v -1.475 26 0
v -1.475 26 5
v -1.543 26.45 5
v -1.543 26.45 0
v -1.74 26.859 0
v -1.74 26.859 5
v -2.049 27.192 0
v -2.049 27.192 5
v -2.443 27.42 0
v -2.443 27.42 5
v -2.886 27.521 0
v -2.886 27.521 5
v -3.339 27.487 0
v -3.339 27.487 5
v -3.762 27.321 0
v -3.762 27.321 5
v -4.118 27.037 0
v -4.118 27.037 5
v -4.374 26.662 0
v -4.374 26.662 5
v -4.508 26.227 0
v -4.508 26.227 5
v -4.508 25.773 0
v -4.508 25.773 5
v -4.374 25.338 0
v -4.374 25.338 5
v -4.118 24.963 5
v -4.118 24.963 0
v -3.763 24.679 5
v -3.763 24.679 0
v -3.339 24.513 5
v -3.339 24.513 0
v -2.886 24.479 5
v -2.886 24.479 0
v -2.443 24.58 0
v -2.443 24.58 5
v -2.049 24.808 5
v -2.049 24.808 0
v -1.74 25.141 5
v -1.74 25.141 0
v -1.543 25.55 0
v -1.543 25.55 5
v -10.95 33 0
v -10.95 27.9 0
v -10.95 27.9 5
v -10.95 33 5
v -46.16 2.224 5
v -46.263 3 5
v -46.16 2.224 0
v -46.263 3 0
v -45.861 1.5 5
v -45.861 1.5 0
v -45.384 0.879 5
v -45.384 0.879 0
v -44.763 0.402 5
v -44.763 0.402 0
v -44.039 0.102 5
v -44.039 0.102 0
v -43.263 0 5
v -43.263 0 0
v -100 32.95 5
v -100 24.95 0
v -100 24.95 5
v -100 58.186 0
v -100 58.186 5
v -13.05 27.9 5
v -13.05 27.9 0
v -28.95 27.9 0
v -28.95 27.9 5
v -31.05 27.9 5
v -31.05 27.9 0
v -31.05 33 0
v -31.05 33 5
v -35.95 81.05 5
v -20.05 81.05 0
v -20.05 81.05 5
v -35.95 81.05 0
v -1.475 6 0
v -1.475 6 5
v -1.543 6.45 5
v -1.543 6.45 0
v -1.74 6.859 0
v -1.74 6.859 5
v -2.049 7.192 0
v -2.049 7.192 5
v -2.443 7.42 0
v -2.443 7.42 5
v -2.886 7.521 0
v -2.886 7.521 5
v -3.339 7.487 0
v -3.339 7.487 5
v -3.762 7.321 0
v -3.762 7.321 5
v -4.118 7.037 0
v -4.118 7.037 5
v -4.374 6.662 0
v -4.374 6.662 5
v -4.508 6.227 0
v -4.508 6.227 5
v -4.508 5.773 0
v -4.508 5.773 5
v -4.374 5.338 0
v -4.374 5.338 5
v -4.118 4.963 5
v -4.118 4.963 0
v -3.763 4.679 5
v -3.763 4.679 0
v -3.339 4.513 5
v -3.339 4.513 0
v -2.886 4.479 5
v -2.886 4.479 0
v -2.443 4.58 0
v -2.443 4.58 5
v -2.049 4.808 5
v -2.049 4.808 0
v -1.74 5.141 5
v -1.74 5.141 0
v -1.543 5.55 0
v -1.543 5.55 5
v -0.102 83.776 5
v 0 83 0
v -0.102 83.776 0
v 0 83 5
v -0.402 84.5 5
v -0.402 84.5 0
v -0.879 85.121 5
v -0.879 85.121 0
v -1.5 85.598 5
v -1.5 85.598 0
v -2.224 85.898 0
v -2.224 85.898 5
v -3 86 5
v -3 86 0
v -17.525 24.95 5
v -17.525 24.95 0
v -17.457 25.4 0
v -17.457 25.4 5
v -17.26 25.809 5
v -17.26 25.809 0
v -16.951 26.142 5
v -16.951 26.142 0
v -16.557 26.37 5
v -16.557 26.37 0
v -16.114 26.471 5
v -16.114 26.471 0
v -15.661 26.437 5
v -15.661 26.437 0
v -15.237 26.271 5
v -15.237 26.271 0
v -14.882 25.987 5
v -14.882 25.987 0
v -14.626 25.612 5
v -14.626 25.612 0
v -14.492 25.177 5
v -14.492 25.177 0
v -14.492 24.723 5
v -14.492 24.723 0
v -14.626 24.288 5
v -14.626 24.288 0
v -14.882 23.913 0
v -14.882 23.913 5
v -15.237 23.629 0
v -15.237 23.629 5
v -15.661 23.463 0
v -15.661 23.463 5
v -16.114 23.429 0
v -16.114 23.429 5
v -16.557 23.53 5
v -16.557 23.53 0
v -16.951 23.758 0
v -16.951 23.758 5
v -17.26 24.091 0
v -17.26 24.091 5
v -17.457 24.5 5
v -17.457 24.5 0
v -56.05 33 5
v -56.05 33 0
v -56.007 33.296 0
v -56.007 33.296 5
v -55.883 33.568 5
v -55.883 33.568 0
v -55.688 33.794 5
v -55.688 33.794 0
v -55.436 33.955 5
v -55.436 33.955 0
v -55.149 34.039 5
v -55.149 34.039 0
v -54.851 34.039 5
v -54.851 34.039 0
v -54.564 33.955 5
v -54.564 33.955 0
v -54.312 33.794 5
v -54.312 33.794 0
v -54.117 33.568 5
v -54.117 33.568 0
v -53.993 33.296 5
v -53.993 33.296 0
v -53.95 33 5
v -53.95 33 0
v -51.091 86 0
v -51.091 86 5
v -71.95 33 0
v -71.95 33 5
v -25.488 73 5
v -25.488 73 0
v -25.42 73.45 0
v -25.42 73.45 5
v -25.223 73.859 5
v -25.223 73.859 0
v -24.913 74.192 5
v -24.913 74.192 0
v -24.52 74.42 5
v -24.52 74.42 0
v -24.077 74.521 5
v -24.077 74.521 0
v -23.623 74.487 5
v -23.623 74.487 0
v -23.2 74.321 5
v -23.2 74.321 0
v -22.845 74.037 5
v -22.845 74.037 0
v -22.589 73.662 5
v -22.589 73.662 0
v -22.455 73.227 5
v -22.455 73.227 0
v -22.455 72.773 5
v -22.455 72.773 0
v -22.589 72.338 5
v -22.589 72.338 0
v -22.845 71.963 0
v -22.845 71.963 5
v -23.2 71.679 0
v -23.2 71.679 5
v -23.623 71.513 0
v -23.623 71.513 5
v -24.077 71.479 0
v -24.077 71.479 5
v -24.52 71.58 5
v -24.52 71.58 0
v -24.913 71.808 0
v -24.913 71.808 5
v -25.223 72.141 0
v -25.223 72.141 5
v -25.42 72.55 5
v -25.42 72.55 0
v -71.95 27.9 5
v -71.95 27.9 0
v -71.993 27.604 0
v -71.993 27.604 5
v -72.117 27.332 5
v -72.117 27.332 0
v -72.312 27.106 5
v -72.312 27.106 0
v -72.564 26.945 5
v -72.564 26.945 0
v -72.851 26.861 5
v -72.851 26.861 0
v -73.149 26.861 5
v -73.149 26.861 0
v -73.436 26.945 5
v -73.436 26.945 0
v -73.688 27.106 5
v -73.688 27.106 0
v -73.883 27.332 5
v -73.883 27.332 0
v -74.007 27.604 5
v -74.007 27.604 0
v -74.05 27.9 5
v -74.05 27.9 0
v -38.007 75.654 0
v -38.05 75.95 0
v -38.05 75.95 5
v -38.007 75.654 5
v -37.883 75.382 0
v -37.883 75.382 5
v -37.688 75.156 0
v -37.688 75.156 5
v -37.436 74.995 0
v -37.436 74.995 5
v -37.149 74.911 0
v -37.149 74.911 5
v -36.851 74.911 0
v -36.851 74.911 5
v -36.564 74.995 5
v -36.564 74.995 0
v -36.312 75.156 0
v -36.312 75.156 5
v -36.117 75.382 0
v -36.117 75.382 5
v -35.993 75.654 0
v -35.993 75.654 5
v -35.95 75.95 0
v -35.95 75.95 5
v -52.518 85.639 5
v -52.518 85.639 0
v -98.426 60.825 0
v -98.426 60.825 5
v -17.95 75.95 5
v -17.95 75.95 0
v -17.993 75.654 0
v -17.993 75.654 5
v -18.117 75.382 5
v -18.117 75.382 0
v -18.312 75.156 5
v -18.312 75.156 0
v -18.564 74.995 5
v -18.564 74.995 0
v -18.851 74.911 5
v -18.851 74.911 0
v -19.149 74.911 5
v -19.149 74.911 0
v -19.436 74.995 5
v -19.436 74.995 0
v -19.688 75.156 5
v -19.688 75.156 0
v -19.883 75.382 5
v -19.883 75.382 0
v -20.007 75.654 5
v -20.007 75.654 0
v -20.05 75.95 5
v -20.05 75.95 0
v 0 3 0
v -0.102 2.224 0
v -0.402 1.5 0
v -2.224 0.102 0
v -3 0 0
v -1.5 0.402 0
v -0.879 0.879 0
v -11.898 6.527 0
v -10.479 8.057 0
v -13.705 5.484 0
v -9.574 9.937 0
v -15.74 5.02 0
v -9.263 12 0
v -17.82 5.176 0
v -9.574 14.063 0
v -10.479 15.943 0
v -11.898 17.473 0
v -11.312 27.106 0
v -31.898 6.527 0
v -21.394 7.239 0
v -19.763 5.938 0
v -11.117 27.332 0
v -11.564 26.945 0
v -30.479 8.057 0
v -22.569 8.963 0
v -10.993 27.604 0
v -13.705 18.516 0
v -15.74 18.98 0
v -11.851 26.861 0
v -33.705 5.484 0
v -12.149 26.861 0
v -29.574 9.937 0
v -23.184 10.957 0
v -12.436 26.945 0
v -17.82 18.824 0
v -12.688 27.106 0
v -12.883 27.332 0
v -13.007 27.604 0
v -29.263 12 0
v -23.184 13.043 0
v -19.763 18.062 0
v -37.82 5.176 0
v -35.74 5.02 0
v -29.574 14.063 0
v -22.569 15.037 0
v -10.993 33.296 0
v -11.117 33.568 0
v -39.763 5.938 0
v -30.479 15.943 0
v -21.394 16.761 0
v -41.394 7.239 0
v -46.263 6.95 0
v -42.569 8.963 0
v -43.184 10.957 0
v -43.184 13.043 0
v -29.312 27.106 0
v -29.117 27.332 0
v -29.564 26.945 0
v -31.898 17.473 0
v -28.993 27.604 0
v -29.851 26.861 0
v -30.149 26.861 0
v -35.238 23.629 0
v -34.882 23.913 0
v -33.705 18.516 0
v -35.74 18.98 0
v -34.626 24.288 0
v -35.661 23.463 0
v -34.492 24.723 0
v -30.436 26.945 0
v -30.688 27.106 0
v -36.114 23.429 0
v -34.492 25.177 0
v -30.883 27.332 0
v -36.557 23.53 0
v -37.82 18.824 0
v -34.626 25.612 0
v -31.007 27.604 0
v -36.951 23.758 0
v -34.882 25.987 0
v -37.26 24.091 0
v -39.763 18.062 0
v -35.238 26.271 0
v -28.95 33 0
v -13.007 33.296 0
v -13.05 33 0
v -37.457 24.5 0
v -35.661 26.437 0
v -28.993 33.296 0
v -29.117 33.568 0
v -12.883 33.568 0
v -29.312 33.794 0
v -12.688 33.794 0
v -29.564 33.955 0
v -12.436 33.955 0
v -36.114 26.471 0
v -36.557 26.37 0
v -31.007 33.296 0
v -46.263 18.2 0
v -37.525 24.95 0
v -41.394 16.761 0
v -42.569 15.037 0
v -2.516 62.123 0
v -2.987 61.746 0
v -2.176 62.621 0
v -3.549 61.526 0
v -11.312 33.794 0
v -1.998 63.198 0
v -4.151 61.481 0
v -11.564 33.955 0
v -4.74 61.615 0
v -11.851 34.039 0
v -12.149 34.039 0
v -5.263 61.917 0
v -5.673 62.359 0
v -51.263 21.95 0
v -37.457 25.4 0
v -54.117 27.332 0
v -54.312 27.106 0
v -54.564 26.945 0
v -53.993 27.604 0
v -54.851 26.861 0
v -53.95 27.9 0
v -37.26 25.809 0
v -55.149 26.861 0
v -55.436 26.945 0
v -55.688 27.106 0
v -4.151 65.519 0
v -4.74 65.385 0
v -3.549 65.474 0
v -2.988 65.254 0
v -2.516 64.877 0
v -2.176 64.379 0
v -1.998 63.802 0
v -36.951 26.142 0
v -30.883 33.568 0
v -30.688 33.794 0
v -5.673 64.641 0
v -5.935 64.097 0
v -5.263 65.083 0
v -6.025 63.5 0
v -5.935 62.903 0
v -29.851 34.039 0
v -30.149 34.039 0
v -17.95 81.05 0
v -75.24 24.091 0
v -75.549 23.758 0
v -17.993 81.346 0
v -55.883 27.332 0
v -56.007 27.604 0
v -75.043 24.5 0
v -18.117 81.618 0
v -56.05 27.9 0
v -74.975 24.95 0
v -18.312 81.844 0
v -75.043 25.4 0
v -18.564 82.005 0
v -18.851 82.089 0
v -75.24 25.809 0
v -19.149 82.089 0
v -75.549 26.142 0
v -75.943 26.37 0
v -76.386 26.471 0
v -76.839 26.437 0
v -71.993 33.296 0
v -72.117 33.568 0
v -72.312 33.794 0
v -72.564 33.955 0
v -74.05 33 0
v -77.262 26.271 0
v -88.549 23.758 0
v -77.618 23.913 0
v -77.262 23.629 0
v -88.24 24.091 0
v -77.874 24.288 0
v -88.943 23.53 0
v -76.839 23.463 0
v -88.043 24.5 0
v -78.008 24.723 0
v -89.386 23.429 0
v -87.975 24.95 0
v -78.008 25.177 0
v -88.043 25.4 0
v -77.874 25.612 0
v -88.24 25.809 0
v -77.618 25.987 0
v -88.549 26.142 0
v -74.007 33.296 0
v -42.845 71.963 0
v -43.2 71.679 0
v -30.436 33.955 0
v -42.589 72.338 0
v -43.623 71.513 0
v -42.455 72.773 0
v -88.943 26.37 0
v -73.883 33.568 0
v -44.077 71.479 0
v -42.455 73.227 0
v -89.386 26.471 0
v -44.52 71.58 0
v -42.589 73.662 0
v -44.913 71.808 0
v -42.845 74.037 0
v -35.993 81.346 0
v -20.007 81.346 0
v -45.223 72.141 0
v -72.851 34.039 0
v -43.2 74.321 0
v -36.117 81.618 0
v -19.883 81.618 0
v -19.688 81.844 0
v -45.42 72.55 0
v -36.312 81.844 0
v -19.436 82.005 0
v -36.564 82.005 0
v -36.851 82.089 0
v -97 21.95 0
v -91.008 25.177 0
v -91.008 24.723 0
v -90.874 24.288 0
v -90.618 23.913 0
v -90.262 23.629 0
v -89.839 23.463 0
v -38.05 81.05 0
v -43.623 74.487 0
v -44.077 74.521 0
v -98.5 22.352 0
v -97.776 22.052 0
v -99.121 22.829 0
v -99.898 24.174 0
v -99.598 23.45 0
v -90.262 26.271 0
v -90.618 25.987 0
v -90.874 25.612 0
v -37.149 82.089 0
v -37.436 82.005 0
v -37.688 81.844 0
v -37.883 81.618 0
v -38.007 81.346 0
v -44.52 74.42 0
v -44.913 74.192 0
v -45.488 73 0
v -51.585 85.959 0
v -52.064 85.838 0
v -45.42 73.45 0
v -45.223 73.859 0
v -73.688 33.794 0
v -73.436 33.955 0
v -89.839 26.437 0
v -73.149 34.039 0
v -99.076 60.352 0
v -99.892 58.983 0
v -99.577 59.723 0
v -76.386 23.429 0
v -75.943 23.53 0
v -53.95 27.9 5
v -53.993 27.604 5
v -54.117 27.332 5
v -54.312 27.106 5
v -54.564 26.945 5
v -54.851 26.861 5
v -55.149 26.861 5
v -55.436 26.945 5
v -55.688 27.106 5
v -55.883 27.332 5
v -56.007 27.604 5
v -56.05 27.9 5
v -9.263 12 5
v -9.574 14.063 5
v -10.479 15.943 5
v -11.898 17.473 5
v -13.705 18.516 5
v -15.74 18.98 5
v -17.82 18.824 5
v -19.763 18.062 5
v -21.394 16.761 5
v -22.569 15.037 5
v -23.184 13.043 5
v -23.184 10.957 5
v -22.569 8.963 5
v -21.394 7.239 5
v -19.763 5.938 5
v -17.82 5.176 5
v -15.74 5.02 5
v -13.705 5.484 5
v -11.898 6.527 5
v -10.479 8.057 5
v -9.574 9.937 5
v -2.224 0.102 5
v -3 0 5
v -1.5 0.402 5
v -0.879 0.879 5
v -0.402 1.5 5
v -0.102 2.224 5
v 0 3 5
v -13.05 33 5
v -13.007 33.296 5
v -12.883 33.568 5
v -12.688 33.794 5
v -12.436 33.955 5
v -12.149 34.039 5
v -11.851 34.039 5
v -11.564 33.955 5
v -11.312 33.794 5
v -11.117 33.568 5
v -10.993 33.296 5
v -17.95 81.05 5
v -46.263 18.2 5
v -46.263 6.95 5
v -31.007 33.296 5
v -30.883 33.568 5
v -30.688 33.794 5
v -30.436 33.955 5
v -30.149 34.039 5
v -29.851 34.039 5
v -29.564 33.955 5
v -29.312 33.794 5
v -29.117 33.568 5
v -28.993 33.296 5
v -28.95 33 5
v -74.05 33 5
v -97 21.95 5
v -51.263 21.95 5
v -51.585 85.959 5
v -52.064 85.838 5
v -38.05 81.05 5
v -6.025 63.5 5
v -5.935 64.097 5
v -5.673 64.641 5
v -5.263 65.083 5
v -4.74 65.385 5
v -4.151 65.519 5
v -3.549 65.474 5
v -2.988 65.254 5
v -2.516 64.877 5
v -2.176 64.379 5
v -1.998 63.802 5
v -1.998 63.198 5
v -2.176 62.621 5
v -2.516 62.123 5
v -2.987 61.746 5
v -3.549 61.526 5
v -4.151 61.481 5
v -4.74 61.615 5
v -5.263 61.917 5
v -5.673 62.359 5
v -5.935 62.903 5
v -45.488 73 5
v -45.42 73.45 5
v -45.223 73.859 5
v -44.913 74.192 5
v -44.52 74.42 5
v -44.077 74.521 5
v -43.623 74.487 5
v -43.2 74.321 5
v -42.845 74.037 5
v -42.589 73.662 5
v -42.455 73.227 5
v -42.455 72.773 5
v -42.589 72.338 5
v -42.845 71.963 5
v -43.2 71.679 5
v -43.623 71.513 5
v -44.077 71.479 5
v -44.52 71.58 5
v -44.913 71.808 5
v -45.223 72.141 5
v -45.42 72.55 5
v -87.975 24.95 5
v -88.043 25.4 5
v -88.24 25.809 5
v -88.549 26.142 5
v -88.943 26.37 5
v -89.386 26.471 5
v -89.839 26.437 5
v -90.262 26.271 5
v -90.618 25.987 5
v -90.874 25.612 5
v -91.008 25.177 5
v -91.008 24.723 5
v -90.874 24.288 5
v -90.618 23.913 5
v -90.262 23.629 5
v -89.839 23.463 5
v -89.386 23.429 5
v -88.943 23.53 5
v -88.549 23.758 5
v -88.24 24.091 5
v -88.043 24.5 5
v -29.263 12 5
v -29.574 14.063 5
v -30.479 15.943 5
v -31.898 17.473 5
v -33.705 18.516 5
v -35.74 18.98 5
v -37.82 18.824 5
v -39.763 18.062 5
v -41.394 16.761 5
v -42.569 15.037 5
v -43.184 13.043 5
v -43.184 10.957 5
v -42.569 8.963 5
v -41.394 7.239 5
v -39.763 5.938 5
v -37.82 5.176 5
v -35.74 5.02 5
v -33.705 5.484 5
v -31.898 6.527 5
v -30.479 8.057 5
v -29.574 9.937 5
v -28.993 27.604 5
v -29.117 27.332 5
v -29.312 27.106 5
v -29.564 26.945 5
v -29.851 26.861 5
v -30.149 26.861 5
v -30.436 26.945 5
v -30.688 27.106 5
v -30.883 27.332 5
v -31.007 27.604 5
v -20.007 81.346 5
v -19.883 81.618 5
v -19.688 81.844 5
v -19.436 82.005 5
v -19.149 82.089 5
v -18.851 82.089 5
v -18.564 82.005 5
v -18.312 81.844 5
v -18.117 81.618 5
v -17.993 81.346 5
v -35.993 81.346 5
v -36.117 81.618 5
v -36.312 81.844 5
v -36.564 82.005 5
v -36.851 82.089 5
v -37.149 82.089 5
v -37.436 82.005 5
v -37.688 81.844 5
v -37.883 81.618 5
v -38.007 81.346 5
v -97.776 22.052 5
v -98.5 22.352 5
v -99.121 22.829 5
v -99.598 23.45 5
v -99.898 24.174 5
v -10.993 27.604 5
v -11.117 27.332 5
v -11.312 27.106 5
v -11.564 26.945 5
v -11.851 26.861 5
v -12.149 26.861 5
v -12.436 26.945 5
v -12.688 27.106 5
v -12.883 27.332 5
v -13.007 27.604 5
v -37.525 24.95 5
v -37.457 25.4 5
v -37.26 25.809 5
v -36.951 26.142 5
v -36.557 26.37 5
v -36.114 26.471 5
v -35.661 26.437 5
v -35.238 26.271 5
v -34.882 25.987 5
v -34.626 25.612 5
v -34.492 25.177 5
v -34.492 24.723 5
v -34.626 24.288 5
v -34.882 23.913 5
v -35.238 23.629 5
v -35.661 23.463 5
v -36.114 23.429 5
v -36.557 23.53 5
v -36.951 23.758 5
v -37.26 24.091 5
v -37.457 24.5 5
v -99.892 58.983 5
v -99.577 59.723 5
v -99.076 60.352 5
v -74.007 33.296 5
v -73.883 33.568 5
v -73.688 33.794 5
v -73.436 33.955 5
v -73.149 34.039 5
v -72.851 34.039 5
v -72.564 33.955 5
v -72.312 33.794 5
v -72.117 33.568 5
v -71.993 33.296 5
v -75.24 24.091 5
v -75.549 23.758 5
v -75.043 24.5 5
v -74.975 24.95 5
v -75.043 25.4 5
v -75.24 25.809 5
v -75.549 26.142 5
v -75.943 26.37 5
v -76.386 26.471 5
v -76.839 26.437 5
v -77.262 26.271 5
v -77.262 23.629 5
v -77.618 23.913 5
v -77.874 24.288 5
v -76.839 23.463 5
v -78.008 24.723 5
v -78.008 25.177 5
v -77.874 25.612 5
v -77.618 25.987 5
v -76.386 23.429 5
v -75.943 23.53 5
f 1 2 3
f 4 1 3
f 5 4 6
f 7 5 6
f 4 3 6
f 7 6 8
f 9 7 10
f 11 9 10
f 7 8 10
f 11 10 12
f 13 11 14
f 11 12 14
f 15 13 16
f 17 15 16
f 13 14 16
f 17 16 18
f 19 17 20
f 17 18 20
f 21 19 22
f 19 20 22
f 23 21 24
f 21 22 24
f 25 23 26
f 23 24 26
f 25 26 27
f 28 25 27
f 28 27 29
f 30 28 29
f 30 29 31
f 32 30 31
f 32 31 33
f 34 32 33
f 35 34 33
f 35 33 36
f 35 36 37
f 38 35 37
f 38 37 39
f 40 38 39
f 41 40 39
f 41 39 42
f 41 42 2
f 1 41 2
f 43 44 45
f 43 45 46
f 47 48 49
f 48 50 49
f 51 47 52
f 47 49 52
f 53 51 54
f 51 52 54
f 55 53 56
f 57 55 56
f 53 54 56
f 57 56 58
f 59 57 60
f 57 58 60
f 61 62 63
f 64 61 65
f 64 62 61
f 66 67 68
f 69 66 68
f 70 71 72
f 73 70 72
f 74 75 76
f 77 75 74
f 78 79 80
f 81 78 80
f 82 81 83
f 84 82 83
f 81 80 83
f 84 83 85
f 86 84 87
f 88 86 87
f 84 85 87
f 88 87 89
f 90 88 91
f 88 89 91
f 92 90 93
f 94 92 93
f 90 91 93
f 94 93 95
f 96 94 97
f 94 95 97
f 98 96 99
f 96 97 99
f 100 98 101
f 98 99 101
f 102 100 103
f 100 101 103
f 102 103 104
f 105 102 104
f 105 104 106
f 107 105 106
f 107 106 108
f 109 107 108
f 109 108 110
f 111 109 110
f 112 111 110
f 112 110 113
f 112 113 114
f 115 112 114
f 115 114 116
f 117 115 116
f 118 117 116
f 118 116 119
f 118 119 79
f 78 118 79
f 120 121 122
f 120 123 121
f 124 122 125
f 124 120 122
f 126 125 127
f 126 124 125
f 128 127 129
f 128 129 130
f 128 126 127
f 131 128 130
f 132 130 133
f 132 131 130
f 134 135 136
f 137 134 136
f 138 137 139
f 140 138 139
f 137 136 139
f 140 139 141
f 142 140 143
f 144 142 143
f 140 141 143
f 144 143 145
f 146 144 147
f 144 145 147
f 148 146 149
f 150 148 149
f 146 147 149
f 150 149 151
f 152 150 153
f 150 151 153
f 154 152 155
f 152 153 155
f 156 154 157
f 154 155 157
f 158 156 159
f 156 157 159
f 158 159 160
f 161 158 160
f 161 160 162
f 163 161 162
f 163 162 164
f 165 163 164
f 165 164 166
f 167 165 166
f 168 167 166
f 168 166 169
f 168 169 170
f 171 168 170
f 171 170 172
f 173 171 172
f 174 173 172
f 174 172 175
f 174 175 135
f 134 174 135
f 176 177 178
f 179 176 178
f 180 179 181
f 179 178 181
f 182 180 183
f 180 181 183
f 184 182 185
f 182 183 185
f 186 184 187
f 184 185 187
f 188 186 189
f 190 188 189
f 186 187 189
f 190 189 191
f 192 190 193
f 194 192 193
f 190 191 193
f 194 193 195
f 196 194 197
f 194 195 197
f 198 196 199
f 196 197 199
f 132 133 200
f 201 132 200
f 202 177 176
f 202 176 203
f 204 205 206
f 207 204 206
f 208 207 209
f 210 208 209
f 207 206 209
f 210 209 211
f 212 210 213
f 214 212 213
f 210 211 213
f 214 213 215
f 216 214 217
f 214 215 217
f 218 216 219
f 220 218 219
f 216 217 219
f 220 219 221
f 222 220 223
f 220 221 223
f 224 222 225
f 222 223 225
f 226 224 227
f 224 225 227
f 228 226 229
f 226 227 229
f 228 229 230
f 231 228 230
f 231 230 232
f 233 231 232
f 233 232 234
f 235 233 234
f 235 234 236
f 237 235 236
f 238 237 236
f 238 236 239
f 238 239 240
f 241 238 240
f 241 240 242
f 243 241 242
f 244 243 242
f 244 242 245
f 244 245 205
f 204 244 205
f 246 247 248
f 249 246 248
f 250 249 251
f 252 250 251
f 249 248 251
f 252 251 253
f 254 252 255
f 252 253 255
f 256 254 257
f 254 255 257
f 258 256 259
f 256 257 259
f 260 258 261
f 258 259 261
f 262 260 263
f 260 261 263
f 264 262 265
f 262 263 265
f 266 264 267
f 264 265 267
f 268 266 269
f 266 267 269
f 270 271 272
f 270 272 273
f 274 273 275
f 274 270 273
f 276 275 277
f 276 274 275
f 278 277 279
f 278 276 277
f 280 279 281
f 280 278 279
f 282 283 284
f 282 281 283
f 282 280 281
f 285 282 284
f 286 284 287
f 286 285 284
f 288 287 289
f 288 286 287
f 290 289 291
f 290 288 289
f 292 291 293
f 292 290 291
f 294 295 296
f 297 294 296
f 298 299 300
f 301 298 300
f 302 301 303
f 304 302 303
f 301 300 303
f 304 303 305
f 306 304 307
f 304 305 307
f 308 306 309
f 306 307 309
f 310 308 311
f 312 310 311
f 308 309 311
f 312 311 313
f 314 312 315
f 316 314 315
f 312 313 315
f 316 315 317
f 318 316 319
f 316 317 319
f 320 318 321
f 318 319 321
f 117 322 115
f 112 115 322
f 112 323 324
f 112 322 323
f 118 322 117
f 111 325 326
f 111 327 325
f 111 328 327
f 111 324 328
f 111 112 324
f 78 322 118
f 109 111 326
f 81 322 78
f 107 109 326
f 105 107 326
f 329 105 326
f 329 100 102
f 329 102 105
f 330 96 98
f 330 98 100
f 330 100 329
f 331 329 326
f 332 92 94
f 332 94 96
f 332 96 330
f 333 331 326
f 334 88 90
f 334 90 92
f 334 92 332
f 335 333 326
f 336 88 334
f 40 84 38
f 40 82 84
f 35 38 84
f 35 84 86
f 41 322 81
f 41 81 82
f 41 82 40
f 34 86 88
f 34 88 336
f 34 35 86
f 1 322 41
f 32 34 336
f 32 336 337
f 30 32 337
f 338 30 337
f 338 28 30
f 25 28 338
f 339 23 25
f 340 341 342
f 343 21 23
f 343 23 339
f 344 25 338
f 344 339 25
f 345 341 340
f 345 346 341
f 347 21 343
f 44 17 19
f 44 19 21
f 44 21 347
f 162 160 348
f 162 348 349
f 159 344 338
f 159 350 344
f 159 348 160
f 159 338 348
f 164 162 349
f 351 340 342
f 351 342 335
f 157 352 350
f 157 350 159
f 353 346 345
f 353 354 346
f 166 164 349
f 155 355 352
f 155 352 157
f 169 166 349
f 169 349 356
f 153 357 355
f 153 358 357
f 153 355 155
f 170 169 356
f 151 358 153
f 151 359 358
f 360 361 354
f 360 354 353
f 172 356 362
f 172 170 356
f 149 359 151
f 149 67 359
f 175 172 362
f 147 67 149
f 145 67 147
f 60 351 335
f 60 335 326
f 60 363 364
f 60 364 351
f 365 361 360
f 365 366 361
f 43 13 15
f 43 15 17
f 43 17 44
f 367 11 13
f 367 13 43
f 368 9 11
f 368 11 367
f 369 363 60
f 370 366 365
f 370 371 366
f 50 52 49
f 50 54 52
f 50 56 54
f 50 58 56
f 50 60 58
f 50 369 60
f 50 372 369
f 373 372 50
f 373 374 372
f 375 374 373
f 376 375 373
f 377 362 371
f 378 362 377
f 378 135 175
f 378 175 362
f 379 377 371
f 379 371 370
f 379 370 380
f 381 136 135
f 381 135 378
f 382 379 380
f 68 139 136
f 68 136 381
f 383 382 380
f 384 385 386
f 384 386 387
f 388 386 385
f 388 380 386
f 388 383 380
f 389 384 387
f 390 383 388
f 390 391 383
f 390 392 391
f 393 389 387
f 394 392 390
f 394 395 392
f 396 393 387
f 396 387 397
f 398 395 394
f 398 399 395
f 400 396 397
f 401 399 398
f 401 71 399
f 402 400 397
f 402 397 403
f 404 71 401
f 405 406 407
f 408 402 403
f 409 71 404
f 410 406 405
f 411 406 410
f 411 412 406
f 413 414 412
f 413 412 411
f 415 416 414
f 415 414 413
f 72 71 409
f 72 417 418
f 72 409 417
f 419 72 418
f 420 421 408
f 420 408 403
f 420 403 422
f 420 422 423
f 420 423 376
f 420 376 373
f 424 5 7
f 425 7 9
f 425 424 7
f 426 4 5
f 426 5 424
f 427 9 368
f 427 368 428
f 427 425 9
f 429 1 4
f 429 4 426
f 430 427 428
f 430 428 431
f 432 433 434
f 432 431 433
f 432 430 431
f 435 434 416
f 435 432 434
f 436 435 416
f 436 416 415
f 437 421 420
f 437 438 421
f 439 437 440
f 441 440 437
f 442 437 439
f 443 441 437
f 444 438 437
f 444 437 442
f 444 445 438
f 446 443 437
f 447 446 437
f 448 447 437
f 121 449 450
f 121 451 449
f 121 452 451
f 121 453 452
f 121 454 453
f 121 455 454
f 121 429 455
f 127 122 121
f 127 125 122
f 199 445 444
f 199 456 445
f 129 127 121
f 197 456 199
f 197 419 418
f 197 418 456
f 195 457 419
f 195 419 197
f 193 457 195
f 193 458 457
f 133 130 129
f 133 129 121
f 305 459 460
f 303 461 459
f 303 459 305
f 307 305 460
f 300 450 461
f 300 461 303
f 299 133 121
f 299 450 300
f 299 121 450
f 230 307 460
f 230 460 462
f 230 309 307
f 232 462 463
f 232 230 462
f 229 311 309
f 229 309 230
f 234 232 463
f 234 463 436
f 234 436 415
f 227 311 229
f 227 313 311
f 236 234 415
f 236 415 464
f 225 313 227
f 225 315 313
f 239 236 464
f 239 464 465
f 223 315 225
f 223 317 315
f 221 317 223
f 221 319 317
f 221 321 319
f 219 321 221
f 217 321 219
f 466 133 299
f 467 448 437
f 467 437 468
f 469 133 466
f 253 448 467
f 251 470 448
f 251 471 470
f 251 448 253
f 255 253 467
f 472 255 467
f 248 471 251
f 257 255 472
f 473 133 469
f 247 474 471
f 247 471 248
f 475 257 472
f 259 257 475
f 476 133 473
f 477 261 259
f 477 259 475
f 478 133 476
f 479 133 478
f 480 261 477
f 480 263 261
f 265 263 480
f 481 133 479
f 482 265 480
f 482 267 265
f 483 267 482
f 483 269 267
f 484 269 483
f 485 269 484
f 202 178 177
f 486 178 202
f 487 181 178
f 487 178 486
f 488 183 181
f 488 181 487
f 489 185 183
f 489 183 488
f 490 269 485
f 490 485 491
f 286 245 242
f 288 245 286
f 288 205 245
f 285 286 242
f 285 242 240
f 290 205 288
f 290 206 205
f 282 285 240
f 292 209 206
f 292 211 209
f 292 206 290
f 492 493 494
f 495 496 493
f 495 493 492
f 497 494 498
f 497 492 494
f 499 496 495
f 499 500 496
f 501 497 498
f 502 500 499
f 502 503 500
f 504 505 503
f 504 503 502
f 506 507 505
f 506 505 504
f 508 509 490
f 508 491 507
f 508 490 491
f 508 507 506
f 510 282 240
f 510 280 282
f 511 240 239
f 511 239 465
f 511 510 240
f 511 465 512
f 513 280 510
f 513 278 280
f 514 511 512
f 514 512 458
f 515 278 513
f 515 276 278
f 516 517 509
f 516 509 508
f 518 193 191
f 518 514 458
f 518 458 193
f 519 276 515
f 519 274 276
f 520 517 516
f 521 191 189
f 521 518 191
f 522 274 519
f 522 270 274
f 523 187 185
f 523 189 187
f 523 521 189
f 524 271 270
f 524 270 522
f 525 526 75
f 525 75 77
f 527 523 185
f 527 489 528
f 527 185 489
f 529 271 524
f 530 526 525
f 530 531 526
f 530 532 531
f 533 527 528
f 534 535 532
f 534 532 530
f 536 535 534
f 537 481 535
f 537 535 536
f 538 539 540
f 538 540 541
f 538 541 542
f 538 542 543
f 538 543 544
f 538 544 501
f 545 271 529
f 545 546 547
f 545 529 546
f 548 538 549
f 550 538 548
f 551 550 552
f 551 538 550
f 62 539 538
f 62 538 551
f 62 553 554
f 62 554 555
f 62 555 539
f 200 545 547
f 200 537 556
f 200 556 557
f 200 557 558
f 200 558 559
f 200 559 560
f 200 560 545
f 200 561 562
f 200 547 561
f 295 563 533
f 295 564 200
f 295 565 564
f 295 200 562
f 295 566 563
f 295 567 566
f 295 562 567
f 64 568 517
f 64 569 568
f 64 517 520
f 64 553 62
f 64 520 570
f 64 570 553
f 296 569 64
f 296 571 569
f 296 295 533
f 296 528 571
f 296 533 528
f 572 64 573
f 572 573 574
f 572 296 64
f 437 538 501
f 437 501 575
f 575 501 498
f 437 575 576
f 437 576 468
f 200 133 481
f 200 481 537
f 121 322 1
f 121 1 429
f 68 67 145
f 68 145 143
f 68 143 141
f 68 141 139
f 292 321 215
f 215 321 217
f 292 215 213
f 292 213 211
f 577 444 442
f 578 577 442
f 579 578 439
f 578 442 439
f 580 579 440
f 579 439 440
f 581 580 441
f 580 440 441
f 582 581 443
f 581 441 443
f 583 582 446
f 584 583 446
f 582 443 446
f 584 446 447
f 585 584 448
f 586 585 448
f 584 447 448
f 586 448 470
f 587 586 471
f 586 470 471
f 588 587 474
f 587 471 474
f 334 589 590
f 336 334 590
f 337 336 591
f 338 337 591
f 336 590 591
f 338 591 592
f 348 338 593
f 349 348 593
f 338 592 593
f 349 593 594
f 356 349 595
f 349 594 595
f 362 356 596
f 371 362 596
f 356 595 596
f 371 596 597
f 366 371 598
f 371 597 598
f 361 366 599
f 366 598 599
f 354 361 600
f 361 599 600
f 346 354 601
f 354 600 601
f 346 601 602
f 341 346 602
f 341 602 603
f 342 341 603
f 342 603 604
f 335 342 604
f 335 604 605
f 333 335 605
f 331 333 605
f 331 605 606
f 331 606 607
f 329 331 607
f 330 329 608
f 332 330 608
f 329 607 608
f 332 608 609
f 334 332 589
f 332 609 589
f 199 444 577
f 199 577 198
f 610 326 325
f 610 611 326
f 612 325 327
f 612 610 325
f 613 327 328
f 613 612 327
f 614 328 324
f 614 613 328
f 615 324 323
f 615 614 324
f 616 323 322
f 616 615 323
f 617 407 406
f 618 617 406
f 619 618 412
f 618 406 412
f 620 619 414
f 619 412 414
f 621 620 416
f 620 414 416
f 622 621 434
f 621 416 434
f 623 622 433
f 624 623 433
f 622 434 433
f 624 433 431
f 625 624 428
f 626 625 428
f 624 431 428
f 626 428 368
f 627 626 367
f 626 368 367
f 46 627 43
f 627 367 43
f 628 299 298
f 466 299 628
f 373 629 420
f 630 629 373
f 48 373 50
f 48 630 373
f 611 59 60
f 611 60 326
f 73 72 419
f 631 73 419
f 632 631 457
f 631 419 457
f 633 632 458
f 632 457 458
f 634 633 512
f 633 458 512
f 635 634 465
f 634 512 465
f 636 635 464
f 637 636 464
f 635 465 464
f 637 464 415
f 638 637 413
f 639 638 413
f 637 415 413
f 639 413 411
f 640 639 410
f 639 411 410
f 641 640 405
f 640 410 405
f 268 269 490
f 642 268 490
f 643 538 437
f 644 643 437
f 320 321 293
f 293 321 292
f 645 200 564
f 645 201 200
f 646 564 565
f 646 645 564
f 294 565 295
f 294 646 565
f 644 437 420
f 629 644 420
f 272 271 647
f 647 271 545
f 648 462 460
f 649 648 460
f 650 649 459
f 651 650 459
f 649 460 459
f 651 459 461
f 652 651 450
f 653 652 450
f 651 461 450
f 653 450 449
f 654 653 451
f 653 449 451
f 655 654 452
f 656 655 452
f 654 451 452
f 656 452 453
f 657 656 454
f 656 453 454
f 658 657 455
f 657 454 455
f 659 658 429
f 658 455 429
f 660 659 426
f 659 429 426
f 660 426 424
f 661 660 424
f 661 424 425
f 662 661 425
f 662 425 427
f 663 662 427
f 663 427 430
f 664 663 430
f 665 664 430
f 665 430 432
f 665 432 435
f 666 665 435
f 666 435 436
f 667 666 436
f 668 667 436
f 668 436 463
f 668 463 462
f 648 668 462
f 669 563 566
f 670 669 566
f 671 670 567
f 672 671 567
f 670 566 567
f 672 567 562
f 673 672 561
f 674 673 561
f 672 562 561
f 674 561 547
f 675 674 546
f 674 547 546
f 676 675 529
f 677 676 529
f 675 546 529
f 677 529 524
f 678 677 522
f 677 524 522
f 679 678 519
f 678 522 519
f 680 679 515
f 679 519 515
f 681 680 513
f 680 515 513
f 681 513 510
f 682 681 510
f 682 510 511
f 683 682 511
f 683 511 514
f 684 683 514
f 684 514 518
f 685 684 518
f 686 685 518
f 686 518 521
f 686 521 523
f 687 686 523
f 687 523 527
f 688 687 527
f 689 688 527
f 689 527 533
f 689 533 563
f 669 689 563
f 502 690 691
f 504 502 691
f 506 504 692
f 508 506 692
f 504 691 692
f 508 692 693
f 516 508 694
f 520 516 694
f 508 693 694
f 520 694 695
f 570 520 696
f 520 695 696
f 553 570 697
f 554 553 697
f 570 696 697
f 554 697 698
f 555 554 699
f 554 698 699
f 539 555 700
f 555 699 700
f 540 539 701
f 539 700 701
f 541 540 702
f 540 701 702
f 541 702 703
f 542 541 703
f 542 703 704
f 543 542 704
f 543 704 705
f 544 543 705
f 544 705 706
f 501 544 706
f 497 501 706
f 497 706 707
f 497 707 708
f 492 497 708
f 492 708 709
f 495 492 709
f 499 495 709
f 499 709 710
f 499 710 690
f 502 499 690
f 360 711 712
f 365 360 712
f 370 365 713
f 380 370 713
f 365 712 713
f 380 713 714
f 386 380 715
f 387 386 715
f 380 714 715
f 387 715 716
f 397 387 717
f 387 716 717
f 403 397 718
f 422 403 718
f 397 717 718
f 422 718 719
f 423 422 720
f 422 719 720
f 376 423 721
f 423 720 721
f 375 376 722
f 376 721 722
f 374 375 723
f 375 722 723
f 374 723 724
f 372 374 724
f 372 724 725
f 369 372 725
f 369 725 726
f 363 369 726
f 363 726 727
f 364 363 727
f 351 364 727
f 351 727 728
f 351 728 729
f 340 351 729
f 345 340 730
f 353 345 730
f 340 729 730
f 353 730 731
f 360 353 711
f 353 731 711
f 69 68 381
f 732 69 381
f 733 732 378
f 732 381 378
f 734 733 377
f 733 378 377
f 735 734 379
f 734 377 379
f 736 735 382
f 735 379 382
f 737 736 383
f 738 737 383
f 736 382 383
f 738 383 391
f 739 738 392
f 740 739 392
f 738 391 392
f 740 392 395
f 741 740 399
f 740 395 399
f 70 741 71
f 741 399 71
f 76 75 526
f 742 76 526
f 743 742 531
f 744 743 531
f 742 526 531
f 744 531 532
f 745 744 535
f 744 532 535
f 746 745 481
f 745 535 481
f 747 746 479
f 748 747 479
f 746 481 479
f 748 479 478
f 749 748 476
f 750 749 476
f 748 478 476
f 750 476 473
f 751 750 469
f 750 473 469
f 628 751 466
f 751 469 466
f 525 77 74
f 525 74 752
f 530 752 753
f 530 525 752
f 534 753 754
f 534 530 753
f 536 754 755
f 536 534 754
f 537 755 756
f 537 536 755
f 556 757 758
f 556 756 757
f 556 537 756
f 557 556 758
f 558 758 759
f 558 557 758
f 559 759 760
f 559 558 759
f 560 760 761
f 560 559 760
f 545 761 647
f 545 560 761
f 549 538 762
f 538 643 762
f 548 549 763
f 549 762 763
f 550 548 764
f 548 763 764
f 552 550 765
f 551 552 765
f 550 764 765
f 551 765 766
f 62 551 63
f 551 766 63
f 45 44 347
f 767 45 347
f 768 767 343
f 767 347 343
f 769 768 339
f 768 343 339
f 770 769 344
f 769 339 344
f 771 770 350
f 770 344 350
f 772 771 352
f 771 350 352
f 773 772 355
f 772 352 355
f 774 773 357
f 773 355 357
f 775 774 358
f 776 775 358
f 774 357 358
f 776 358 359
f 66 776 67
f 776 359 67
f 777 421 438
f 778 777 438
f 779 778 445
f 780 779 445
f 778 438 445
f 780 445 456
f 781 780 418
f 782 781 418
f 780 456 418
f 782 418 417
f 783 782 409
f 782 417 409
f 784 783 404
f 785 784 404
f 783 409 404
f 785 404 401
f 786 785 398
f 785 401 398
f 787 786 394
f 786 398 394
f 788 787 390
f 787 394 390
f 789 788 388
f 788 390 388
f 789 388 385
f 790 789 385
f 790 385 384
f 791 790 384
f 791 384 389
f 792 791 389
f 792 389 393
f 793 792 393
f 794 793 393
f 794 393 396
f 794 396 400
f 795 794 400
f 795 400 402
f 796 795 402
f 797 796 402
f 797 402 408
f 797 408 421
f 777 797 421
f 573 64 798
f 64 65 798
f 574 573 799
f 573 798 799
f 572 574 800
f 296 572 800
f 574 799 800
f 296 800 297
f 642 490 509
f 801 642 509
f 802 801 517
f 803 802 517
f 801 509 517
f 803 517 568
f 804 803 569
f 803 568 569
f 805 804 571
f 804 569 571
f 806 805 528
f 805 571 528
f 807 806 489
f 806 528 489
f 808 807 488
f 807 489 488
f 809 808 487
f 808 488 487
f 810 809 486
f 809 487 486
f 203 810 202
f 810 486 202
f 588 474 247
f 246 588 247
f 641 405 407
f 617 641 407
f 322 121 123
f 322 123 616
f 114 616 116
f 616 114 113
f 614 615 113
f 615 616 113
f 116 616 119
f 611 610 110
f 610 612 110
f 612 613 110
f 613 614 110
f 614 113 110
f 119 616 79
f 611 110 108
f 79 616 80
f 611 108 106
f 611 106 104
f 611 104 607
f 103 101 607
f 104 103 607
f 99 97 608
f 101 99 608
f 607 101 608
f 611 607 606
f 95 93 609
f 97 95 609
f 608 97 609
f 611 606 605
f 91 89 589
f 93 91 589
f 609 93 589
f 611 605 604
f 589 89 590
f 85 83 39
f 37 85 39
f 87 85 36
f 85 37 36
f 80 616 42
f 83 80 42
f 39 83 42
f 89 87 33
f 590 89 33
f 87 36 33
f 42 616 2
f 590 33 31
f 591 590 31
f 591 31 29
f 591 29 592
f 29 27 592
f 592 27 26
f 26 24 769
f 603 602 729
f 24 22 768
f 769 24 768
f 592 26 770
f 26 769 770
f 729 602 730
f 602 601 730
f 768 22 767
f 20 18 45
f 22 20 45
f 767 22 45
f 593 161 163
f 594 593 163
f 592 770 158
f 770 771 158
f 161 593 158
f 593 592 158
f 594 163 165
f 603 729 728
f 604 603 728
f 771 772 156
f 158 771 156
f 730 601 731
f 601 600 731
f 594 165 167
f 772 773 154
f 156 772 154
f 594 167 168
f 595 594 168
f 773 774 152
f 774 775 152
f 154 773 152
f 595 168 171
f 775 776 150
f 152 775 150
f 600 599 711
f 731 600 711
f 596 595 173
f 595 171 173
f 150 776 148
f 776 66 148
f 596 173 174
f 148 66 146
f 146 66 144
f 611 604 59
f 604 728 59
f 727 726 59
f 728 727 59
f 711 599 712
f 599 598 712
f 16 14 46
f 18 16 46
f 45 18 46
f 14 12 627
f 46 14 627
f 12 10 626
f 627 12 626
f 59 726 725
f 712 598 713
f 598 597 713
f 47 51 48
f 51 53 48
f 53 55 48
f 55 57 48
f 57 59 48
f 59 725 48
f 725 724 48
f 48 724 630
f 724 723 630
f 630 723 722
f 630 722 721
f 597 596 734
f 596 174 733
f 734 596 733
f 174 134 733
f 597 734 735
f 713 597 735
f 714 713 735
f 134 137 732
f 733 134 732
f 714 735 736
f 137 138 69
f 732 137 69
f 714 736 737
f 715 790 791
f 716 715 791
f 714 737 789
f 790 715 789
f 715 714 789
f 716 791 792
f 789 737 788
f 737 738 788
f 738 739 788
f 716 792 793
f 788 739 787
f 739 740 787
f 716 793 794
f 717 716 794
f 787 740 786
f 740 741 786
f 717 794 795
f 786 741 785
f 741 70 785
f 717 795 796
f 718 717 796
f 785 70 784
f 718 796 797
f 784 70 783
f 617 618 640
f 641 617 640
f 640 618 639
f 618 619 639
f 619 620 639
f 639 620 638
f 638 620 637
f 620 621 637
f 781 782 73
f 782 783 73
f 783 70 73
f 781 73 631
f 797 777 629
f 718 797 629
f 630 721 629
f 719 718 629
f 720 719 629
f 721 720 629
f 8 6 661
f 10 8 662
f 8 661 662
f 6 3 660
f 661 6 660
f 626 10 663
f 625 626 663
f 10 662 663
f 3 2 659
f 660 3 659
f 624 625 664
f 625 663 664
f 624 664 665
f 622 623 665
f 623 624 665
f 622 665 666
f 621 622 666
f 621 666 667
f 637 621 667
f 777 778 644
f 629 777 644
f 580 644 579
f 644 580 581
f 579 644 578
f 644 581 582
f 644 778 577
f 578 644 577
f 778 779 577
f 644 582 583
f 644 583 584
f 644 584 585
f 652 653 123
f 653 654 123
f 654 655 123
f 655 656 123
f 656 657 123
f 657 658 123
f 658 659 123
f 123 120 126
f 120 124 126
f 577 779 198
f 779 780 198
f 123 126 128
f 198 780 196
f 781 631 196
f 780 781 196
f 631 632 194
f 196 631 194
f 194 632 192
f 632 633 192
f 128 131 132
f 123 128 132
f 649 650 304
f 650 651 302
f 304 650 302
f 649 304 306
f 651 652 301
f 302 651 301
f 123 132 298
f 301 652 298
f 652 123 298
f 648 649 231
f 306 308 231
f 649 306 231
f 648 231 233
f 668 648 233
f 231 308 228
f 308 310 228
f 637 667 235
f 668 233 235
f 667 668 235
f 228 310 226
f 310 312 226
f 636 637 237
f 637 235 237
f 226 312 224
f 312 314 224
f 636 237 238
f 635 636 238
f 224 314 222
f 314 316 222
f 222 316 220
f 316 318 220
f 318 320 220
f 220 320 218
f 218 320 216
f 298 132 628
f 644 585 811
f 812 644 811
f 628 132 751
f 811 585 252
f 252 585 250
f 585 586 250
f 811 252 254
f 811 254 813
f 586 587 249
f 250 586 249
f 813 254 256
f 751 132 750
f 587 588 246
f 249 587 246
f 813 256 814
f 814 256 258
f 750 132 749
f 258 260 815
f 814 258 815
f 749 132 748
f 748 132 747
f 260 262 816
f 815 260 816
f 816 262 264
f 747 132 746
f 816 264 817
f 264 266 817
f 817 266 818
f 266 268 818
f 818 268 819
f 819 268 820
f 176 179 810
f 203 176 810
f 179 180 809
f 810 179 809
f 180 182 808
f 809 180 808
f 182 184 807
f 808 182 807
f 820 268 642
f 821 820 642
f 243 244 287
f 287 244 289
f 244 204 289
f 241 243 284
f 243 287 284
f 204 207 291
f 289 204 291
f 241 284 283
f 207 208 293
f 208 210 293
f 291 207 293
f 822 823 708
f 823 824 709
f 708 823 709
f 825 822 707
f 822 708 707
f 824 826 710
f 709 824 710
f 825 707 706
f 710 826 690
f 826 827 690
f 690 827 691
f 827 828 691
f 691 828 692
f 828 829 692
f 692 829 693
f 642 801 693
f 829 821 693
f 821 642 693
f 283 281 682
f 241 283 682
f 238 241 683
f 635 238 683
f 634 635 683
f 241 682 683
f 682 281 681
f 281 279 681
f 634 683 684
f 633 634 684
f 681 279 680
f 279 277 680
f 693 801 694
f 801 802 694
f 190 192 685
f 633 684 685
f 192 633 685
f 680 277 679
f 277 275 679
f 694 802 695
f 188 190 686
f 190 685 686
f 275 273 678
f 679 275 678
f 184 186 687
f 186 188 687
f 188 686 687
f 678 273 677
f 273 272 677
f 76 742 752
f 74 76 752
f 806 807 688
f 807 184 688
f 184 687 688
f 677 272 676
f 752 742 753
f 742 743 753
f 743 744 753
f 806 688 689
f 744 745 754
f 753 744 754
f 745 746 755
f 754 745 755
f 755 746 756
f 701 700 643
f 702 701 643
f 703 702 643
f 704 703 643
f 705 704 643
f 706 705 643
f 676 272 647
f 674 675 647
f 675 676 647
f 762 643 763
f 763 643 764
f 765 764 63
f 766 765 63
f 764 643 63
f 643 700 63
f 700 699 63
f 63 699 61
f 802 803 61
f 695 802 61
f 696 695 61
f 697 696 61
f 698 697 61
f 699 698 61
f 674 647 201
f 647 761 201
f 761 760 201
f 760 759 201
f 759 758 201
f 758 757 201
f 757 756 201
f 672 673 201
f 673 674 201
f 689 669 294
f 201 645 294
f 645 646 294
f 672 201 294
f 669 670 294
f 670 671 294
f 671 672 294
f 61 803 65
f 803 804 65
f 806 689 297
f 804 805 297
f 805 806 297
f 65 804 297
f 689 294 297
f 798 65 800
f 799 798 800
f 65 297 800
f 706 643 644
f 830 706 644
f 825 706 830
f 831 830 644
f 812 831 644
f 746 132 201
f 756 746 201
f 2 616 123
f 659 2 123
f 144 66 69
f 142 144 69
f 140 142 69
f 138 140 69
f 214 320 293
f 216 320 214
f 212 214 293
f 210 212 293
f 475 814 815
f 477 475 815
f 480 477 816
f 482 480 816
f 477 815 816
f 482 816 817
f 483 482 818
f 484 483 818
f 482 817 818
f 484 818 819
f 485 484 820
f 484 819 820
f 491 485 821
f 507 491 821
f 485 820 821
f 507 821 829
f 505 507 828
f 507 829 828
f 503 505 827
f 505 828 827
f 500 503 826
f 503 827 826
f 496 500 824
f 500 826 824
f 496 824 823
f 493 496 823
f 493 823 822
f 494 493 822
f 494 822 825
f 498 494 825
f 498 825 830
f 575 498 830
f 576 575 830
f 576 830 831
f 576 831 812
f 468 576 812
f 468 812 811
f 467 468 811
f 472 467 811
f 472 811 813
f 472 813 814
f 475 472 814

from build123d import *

# Parameters (mm, degrees)
EXTRUDE_1_DEPTH           = 5
SKETCH_4_W                = 20.1
SKETCH_4_H                = 5.1
CUT_EXTRUDE_3_DEPTH       = 1
CUT_EXTRUDE_3_DEPTH_BACK  = 6
CUT_EXTRUDE_4_DEPTH       = 6
SKETCH_6_R                = 1.525
CUT_EXTRUDE_5_DEPTH       = 1
CUT_EXTRUDE_5_DEPTH_BACK  = 6
CUT_EXTRUDE_6_DEPTH       = 1
CUT_EXTRUDE_6_DEPTH_BACK  = 6
SKETCH_8_W                = 53.737387097
SKETCH_8_H                = 38.025
EXTRUDE_2_DEPTH           = 5
SKETCH_11_R               = 1.525
CUT_EXTRUDE_9_DEPTH       = 1
CUT_EXTRUDE_9_DEPTH_BACK  = 6
SKETCH_14_R               = 2.025
CUT_EXTRUDE_10_DEPTH      = 10
SKETCH_15_W               = 2.1
SKETCH_15_H               = 5.1
SKETCH_15_W_2             = 15.9
CUT_EXTRUDE_11_DEPTH      = 6
SKETCH_16_R               = 1.525
CUT_EXTRUDE_12_DEPTH      = 1
CUT_EXTRUDE_12_DEPTH_BACK = 6
CUT_EXTRUDE_13_DEPTH      = 10
EXTRUDE_3_DEPTH           = 5
EXTRUDE_4_DEPTH           = 5
FILLET_1_R                = 3
SKETCH_20_R               = 7
CUT_EXTRUDE_14_DEPTH      = 5
SKETCH_21_R               = 1.525
CUT_EXTRUDE_15_DEPTH      = 8
CUT_EXTRUDE_17_DEPTH      = 6


with BuildPart() as part:
    # 草图1 → 凸台-拉伸1 (new body)
    with BuildSketch(Plane.XY):
        Polygon((0, 0), (-46.262612903, 16.838214056), (-46.262612903, 27.95), (-86.262612903, 27.95), (-100, 32.95), (-100, 87), (0, 87), align=None)
    extrude(amount=EXTRUDE_1_DEPTH)

    # 草图4 → 切除-拉伸3 (cut, two sides)
    with BuildSketch(Plane(origin=(0, 0, 0), x_dir=(-1, 0, 0), z_dir=(0, 0, -1))) as cut_extrude_3_sk:
        with Locations((28, 78.5)):
            Rectangle(SKETCH_4_W, SKETCH_4_H)
    extrude(amount=CUT_EXTRUDE_3_DEPTH, mode=Mode.SUBTRACT)
    extrude(cut_extrude_3_sk.sketch, amount=-CUT_EXTRUDE_3_DEPTH_BACK, mode=Mode.SUBTRACT)

    # 草图5 → 切除-拉伸4 (cut, through all)
    with BuildSketch(Plane(origin=(0, 0, 0), x_dir=(-1, 0, 0), z_dir=(0, 0, -1))):
        with BuildLine():
            Line((38.05, 81.05), (38.05, 75.95))
            ThreePointArc((38.05, 75.95), (37, 74.9), (35.95, 75.95))
            Line((35.95, 75.95), (35.95, 81.05))
            ThreePointArc((35.95, 81.05), (37, 82.1), (38.05, 81.05))
        make_face()
        with BuildLine():
            Line((17.95, 81.05), (17.95, 75.95))
            ThreePointArc((17.95, 75.95), (19, 74.9), (20.05, 75.95))
            Line((20.05, 75.95), (20.05, 81.05))
            ThreePointArc((20.05, 81.05), (19, 82.1), (17.95, 81.05))
        make_face()
    extrude(amount=-CUT_EXTRUDE_4_DEPTH, mode=Mode.SUBTRACT)

    # 草图6 → 切除-拉伸5 (cut, two sides)
    with BuildSketch(Plane(origin=(0, 0, 0), x_dir=(-1, 0, 0), z_dir=(0, 0, -1))) as cut_extrude_5_sk:
        with Locations((23.96256416, 73)):
            Circle(SKETCH_6_R)
        with Locations((43.96256416, 73)):
            Circle(SKETCH_6_R)
    extrude(amount=CUT_EXTRUDE_5_DEPTH, mode=Mode.SUBTRACT)
    extrude(cut_extrude_5_sk.sketch, amount=-CUT_EXTRUDE_5_DEPTH_BACK, mode=Mode.SUBTRACT)

    # 草图7 → 切除-拉伸6 (cut, two sides)
    with BuildSketch(Plane(origin=(0, 0, 0), x_dir=(-1, 0, 0), z_dir=(0, 0, -1))) as cut_extrude_6_sk:
        Polygon((50, 87), (100, 59.975), (100, 87), align=None)
    extrude(amount=CUT_EXTRUDE_6_DEPTH, mode=Mode.SUBTRACT)
    extrude(cut_extrude_6_sk.sketch, amount=-CUT_EXTRUDE_6_DEPTH_BACK, mode=Mode.SUBTRACT)

    # 草图8 → 凸台-拉伸2 (add)
    with BuildSketch(Plane(origin=(0, 0, 0), x_dir=(-1, 0, 0), z_dir=(0, 0, -1))):
        with Locations((73.131306451, 40.9625)):
            Rectangle(SKETCH_8_W, SKETCH_8_H)
    extrude(amount=-EXTRUDE_2_DEPTH)

    # 草图11 → 切除-拉伸9 (cut, two sides)
    with BuildSketch(Plane.XY.offset(5)) as cut_extrude_9_sk:
        with Locations((-3, 6)):
            Circle(SKETCH_11_R)
        with Locations((-3, 26)):
            Circle(SKETCH_11_R)
    extrude(amount=CUT_EXTRUDE_9_DEPTH, mode=Mode.SUBTRACT)
    extrude(cut_extrude_9_sk.sketch, amount=-CUT_EXTRUDE_9_DEPTH_BACK, mode=Mode.SUBTRACT)

    # 草图14 → 切除-拉伸10 (cut)
    with BuildSketch(Plane(origin=(0, 0, 0), x_dir=(-1, 0, 0), z_dir=(0, 0, -1))):
        with Locations((4, 63.499999999)):
            Circle(SKETCH_14_R)
    extrude(amount=-CUT_EXTRUDE_10_DEPTH, mode=Mode.SUBTRACT)

    # 草图15 → 切除-拉伸11 (cut, through all)
    with BuildSketch(Plane(origin=(0, 0, 0), x_dir=(-1, 0, 0), z_dir=(0, 0, -1))):
        with BuildLine():
            ThreePointArc((56.05, 33), (55, 34.05), (53.95, 33))
            Line((53.95, 33), (56.05, 33))
        make_face()
        with Locations((55, 30.45)):
            Rectangle(SKETCH_15_W, SKETCH_15_H)
        with Locations((64, 30.45)):
            Rectangle(SKETCH_15_W_2, SKETCH_15_H)
        with BuildLine():
            Line((56.05, 27.9), (53.95, 27.9))
            ThreePointArc((53.95, 27.9), (55, 26.85), (56.05, 27.9))
        make_face()
        with BuildLine():
            ThreePointArc((74.05, 33), (73, 34.05), (71.95, 33))
            Line((71.95, 33), (74.05, 33))
        make_face()
        with Locations((73, 30.45)):
            Rectangle(SKETCH_15_W, SKETCH_15_H)
        with BuildLine():
            Line((74.05, 27.9), (71.95, 27.9))
            ThreePointArc((71.95, 27.9), (73, 26.85), (74.05, 27.9))
        make_face()
        with Locations((12, 30.45)):
            Rectangle(SKETCH_15_W, SKETCH_15_H)
        with BuildLine():
            Line((13.05, 27.9), (10.95, 27.9))
            ThreePointArc((10.95, 27.9), (12, 26.85), (13.05, 27.9))
        make_face()
        with Locations((21, 30.45)):
            Rectangle(SKETCH_15_W_2, SKETCH_15_H)
        with BuildLine():
            ThreePointArc((13.05, 33), (12, 34.05), (10.95, 33))
            Line((10.95, 33), (13.05, 33))
        make_face()
        with Locations((30, 30.45)):
            Rectangle(SKETCH_15_W, SKETCH_15_H)
        with BuildLine():
            Line((31.05, 27.9), (28.95, 27.9))
            ThreePointArc((28.95, 27.9), (30, 26.85), (31.05, 27.9))
        make_face()
        with BuildLine():
            ThreePointArc((31.05, 33), (30, 34.05), (28.95, 33))
            Line((28.95, 33), (31.05, 33))
        make_face()
    extrude(amount=-CUT_EXTRUDE_11_DEPTH, mode=Mode.SUBTRACT)

    # 草图16 → 切除-拉伸12 (cut, two sides)
    with BuildSketch(Plane(origin=(0, 0, 0), x_dir=(-1, 0, 0), z_dir=(0, 0, -1))) as cut_extrude_12_sk:
        with Locations((16, 24.95)):
            Circle(SKETCH_16_R)
        with Locations((36, 24.95)):
            Circle(SKETCH_16_R)
    extrude(amount=CUT_EXTRUDE_12_DEPTH, mode=Mode.SUBTRACT)
    extrude(cut_extrude_12_sk.sketch, amount=-CUT_EXTRUDE_12_DEPTH_BACK, mode=Mode.SUBTRACT)

    # 草图17 → 切除-拉伸13 (cut)
    with BuildSketch(Plane(origin=(0, 0, 0), x_dir=(-1, 0, 0), z_dir=(0, 0, -1))):
        Polygon((0, 86), (51.85013876, 86), (50, 87), (0, 87), align=None)
    extrude(amount=-CUT_EXTRUDE_13_DEPTH, mode=Mode.SUBTRACT)

    # 草图18 → 凸台-拉伸3 (add)
    with BuildSketch(Plane.XY.offset(5)):
        Polygon((-46.262612903, 16.838214056), (-46.262612903, 0), (0, 0), align=None)
    extrude(amount=-EXTRUDE_3_DEPTH)

    # 草图19 → 凸台-拉伸4 (add)
    with BuildSketch(Plane.XY.offset(5)):
        Polygon((-46.262612903, 6.95), (-66.262612903, 21.95), (-46.262612903, 21.95), align=None)
    extrude(amount=-EXTRUDE_4_DEPTH)

    # 圆角1
    fillet_1_edges = [part.edges().sort_by_distance(p)[0] for p in [
        (-100, 21.95, 2.5),
        (0, 0, 2.5),
        (-51.85013876, 86, 2.5),
        (0, 86, 2.5),
        (-46.262612903, 0, 2.5),
        (-100, 59.975, 2.5),
    ]]
    fillet(fillet_1_edges, radius=FILLET_1_R)

    # 草图20 → 切除-拉伸14 (cut)
    with BuildSketch(Plane.XY.offset(5)):
        with Locations((-36.262612903, 12)):
            Circle(SKETCH_20_R)
        with Locations((-16.262612903, 12)):
            Circle(SKETCH_20_R)
    extrude(amount=-CUT_EXTRUDE_14_DEPTH, mode=Mode.SUBTRACT)

    # 草图21 → 切除-拉伸15 (cut)
    with BuildSketch(Plane.XY.offset(5)):
        with Locations((-89.5, 24.95)):
            Circle(SKETCH_21_R)
        with Locations((-76.5, 24.95)):
            Circle(SKETCH_21_R)
    extrude(amount=-CUT_EXTRUDE_15_DEPTH, mode=Mode.SUBTRACT)

    # 草图23 → 切除-拉伸17 (cut, through all)
    with BuildSketch(Plane(origin=(0, 0, 0), x_dir=(-1, 0, 0), z_dir=(0, 0, -1))):
        Polygon((46.262612903, 18.2), (46.262612903, 6.95), (66.262612903, 21.95), (51.262612903, 21.95), align=None)
    extrude(amount=-CUT_EXTRUDE_17_DEPTH, mode=Mode.SUBTRACT)


solid = part.part
